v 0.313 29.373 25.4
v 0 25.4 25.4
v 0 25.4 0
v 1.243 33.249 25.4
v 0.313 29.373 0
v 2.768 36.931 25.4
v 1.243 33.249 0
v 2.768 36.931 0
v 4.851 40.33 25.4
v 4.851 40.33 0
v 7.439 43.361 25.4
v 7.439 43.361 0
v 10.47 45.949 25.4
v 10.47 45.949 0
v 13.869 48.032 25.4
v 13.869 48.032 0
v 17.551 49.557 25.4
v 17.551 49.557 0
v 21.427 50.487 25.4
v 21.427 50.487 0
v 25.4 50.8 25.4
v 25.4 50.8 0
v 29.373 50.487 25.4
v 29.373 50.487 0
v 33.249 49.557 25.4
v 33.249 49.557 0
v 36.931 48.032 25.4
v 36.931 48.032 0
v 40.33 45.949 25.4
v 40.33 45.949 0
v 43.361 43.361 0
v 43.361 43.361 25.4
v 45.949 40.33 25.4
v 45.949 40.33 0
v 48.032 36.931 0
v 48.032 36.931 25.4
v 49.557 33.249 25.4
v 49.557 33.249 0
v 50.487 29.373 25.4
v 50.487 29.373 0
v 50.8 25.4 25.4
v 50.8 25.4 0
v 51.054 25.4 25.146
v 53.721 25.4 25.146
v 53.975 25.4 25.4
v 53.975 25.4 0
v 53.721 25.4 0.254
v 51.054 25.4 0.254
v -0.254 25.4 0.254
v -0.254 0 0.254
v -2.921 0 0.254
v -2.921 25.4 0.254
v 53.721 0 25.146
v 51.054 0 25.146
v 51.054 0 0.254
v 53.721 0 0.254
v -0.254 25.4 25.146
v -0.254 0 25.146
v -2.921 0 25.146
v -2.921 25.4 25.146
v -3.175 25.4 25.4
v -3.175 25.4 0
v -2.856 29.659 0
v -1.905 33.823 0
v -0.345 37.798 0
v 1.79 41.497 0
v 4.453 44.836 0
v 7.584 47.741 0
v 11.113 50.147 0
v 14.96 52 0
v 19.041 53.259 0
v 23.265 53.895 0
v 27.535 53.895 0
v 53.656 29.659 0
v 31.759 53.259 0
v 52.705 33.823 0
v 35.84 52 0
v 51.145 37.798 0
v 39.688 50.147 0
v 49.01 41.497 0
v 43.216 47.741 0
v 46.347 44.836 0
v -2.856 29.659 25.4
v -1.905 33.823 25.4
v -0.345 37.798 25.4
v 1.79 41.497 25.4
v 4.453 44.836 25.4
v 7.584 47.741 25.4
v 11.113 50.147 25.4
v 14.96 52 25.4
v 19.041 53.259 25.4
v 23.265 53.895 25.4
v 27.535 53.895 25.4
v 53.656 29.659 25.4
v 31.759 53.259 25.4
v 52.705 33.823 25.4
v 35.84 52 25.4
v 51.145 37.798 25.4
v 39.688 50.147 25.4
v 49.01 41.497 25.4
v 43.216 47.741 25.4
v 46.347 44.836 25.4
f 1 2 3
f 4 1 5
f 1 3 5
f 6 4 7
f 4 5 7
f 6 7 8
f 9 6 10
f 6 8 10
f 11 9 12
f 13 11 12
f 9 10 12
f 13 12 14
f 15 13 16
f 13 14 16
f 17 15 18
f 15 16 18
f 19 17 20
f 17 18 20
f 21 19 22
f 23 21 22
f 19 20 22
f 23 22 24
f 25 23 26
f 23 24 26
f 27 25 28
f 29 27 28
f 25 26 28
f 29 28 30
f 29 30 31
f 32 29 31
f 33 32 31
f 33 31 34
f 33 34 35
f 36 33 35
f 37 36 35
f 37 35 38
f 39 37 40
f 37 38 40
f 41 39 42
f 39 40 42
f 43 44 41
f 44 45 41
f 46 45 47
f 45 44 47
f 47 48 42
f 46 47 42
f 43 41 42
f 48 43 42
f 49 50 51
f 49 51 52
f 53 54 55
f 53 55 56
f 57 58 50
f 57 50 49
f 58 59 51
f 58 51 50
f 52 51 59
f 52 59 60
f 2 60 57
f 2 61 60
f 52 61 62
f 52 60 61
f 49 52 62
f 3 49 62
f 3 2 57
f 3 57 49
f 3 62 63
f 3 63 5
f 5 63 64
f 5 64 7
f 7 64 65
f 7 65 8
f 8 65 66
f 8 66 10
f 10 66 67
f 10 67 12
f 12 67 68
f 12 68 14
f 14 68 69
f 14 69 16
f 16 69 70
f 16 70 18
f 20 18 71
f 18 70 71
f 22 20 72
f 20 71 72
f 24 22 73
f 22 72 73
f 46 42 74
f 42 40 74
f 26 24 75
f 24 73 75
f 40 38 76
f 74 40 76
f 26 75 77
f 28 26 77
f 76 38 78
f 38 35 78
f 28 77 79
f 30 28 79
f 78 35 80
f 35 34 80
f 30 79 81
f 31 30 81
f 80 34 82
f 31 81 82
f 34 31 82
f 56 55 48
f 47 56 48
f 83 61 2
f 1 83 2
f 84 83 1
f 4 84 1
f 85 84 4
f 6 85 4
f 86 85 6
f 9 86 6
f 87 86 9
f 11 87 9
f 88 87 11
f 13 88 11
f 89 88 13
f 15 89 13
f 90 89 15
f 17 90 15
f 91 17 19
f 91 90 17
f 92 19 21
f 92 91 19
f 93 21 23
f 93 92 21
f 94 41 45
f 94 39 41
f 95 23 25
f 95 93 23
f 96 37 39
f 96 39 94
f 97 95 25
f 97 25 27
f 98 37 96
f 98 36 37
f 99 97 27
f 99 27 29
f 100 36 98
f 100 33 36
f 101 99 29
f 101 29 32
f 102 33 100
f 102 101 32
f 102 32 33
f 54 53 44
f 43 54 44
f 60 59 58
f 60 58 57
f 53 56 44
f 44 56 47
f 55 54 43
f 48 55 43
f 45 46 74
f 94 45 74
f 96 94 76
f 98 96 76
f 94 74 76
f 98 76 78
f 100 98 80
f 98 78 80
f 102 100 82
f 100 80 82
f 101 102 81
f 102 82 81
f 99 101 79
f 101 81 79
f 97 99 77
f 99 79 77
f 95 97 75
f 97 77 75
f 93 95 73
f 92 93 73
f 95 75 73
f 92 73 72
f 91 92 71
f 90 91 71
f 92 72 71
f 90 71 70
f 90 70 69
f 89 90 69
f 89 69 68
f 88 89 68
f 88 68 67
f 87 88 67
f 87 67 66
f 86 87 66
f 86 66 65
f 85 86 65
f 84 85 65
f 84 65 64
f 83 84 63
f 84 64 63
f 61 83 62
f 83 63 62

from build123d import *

# Parameters (mm, degrees)
F1_DEPTH = 25.4
F2_W     = 0.254
F2_H     = 25.4
F4_W     = 0.254
F4_H     = 25.4


with BuildPart() as f1:
    # F0 (on Top) → F1 (new body)
    with BuildSketch(Plane.XY):
        with BuildLine():
            Line((-3.175, 0), (0, 0))
            Line((0, 0), (0, 25.4))
            ThreePointArc((0, 25.4), (25.4, 50.8), (50.8, 25.4))
            Line((50.8, 25.4), (50.8, 0))
            Line((50.8, 0), (53.975, 0))
            Line((53.975, 0), (53.975, 25.4))
            ThreePointArc((53.975, 25.4), (25.4, 53.975), (-3.175, 25.4))
            Line((-3.175, 25.4), (-3.175, 0))
        make_face()
    extrude(amount=F1_DEPTH)

    # F3: sweep along a path in F3_path
    with BuildLine(Plane(origin=(-3.175, 0, 25.4), x_dir=(0, 0, -1), z_dir=(0, 1, 0))) as f3_path:
        Line((0, 0), (25.4, 0))
        Line((25.4, 0), (25.4, -3.175))
        Line((25.4, -3.175), (0, -3.175))
        Line((0, -3.175), (0, 0))
    # F2 (on face) → F3 (sweep, cut)
    with BuildSketch(Plane.XY.offset(25.4)):
        with Locations((-3.048, 12.7)):
            Rectangle(F2_W, F2_H)
    sweep(path=f3_path.line, transition=Transition.RIGHT, mode=Mode.SUBTRACT)

    # F5: sweep along a path in F5_path
    with BuildLine(Plane(origin=(50.8, 0, 0), x_dir=(0, 0, 1), z_dir=(0, -1, 0))) as f5_path:
        Line((0, 0), (25.4, 0))
        Line((25.4, 0), (25.4, -3.175))
        Line((25.4, -3.175), (0, -3.175))
        Line((0, -3.175), (0, 0))
    # F4 (on face) → F5 (sweep, cut)
    with BuildSketch(Plane.XY.offset(25.4)):
        with Locations((50.927, 12.7)):
            Rectangle(F4_W, F4_H)
    sweep(path=f5_path.line, transition=Transition.RIGHT, mode=Mode.SUBTRACT)


solid = f1.part
